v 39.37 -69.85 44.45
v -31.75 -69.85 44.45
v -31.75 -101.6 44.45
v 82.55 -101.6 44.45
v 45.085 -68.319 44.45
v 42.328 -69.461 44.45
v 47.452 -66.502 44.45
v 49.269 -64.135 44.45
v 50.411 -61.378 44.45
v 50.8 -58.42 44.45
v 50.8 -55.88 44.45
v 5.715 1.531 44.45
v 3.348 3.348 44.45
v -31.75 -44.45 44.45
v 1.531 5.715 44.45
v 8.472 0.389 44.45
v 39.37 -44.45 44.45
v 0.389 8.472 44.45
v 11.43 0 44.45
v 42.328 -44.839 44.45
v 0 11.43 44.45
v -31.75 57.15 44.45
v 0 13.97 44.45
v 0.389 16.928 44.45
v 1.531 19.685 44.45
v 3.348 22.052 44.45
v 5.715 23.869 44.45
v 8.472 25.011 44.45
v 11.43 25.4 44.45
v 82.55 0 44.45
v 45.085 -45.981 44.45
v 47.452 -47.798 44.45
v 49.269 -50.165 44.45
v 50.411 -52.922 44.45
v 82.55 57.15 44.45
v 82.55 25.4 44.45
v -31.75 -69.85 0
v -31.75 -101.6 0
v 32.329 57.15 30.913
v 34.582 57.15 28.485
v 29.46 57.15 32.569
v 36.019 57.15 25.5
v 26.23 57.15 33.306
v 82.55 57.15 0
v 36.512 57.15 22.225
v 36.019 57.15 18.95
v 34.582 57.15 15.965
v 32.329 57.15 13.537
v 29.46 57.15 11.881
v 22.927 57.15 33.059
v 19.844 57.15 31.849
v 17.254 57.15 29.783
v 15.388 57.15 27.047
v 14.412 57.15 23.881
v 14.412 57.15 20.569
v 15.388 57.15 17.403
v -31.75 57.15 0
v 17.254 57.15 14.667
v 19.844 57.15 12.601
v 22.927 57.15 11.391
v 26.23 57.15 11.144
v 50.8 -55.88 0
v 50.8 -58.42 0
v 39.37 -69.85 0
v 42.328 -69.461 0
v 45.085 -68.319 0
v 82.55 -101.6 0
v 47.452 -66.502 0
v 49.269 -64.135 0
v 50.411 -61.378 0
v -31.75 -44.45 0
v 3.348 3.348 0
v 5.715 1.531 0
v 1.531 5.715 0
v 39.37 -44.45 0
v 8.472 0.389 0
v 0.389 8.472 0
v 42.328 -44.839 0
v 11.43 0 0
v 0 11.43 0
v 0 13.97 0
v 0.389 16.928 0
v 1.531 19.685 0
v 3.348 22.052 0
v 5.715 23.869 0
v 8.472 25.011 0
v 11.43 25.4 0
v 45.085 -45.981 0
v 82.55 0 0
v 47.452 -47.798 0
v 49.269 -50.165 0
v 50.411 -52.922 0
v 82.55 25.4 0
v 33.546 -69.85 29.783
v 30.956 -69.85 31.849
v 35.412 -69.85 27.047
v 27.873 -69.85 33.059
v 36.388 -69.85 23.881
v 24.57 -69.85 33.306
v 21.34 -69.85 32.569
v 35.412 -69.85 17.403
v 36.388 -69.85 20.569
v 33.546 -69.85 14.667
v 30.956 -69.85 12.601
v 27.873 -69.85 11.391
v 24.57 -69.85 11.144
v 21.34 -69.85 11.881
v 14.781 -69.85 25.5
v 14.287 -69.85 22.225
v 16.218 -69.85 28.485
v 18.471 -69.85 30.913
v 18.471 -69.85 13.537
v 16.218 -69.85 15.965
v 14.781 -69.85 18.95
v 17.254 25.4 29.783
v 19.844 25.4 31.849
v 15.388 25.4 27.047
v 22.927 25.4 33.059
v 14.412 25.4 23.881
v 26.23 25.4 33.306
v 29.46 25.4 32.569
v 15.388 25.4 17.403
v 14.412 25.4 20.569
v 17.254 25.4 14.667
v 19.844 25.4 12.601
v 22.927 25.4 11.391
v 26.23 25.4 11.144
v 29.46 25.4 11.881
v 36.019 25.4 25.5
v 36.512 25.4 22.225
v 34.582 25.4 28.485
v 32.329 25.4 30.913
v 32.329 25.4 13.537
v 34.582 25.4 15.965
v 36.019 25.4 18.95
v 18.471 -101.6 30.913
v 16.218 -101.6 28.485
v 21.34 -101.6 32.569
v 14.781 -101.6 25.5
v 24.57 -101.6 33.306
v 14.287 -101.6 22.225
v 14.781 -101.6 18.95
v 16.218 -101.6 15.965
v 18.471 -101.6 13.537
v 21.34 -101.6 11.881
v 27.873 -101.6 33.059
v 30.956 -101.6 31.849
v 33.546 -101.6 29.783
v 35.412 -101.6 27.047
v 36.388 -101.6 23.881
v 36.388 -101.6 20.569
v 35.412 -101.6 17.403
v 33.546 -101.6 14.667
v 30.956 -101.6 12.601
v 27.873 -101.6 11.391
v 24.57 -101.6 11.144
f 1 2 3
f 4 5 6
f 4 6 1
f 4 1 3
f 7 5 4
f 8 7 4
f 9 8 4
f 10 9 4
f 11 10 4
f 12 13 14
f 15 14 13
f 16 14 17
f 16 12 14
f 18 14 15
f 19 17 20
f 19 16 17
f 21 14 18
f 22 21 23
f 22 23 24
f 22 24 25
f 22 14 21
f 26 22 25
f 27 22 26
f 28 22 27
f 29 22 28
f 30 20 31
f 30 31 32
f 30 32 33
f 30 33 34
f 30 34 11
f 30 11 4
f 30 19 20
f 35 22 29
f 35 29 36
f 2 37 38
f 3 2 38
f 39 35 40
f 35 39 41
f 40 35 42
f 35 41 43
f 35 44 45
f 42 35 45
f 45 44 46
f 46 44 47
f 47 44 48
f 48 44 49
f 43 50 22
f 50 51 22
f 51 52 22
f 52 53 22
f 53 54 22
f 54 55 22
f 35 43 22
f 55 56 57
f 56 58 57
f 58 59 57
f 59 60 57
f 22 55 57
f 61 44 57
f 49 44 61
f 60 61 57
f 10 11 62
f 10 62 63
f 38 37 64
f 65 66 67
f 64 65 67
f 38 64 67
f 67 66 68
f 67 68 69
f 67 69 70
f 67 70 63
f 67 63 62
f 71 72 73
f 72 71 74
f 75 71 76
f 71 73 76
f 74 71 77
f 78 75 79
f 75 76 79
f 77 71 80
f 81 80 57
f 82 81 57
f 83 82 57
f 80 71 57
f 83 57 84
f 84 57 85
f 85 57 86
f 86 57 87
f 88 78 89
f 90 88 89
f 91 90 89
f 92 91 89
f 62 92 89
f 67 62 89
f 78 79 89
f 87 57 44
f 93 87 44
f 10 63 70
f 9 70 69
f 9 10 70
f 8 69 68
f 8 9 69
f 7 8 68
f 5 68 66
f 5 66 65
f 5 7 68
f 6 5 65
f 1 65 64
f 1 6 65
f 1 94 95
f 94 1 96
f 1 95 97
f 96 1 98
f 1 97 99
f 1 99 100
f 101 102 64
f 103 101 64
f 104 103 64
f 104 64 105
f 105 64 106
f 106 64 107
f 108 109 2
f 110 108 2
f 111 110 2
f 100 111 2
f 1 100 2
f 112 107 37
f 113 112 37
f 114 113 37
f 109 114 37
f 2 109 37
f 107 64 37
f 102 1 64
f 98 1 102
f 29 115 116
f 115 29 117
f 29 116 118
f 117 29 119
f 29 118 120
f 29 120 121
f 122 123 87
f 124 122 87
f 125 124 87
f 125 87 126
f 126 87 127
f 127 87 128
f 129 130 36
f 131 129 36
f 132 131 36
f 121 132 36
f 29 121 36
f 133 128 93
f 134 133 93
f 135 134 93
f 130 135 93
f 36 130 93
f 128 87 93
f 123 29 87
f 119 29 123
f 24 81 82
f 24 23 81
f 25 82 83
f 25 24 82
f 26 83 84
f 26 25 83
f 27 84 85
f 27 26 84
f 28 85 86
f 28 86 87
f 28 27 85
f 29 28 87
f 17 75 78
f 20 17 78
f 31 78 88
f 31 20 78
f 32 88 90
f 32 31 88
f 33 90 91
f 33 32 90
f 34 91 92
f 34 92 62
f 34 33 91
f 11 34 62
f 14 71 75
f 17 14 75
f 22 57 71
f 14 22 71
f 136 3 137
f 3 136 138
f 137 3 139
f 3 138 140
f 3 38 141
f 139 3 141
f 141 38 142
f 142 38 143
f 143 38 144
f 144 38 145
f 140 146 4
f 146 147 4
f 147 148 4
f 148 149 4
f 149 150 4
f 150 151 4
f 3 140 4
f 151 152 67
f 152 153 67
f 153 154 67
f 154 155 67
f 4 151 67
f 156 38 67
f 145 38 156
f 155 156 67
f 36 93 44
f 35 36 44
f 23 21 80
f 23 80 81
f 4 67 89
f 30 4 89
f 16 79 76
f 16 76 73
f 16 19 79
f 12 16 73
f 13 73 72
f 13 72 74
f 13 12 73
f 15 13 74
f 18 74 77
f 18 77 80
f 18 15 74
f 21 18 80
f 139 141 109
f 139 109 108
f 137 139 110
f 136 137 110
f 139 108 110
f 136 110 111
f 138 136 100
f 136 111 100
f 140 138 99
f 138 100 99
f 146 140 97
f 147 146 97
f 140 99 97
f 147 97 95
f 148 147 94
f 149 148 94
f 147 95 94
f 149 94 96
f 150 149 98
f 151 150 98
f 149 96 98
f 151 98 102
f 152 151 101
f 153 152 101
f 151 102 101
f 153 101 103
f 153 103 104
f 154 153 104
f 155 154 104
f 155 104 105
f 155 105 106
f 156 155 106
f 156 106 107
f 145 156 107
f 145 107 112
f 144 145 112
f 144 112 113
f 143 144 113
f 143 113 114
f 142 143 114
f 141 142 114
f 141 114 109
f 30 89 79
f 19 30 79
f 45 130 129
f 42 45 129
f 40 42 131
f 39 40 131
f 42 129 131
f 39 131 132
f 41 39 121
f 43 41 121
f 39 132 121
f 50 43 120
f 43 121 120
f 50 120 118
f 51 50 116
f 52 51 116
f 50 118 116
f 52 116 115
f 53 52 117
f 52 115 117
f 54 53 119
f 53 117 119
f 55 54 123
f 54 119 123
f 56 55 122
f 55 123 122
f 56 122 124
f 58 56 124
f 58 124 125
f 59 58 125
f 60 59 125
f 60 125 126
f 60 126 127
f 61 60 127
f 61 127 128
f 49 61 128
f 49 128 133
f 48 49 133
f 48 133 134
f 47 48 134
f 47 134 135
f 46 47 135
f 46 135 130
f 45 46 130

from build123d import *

# Parameters (mm, degrees)
BOSS_EXTRUDE1_DEPTH      = 44.45
FILLET1_R                = 11.43
F_1_8_TAPPED_HOLE1_D     = 22.225
F_1_8_TAPPED_HOLE1_DEPTH = 31.75
F_1_8_TAPPED_HOLE2_D     = 22.225
F_1_8_TAPPED_HOLE2_DEPTH = 31.75


with BuildPart() as part:
    # Sketch1 → Boss-Extrude1 (new body)
    with BuildSketch(Plane.XY):
        Polygon((82.55, 0), (0, 0), (0, 25.4), (82.55, 25.4), (82.55, 57.15), (-31.75, 57.15), (-31.75, -44.45), (50.8, -44.45), (50.8, -69.85), (-31.75, -69.85), (-31.75, -101.6), (82.55, -101.6), align=None)
    extrude(amount=BOSS_EXTRUDE1_DEPTH)

    # Fillet1
    fillet1_edges = [part.edges().sort_by_distance(p)[0] for p in [
        (50.8, -69.85, 22.225),
        (50.8, -44.45, 22.225),
        (0, 25.4, 22.225),
        (0, 0, 22.225),
    ]]
    fillet(fillet1_edges, radius=FILLET1_R)

    # 1-8 Tapped Hole1
    with Locations(Plane.XZ.offset(101.6)):
        with Locations((25.4, 22.225)):
            Hole(F_1_8_TAPPED_HOLE1_D / 2, depth=F_1_8_TAPPED_HOLE1_DEPTH)

    # 1-8 Tapped Hole2
    with Locations(Plane(origin=(0, 57.15, 0), x_dir=(-1, 0, 0), z_dir=(0, 1, 0))):
        with Locations((-25.4, 22.225)):
            Hole(F_1_8_TAPPED_HOLE2_D / 2, depth=F_1_8_TAPPED_HOLE2_DEPTH)


solid = part.part
